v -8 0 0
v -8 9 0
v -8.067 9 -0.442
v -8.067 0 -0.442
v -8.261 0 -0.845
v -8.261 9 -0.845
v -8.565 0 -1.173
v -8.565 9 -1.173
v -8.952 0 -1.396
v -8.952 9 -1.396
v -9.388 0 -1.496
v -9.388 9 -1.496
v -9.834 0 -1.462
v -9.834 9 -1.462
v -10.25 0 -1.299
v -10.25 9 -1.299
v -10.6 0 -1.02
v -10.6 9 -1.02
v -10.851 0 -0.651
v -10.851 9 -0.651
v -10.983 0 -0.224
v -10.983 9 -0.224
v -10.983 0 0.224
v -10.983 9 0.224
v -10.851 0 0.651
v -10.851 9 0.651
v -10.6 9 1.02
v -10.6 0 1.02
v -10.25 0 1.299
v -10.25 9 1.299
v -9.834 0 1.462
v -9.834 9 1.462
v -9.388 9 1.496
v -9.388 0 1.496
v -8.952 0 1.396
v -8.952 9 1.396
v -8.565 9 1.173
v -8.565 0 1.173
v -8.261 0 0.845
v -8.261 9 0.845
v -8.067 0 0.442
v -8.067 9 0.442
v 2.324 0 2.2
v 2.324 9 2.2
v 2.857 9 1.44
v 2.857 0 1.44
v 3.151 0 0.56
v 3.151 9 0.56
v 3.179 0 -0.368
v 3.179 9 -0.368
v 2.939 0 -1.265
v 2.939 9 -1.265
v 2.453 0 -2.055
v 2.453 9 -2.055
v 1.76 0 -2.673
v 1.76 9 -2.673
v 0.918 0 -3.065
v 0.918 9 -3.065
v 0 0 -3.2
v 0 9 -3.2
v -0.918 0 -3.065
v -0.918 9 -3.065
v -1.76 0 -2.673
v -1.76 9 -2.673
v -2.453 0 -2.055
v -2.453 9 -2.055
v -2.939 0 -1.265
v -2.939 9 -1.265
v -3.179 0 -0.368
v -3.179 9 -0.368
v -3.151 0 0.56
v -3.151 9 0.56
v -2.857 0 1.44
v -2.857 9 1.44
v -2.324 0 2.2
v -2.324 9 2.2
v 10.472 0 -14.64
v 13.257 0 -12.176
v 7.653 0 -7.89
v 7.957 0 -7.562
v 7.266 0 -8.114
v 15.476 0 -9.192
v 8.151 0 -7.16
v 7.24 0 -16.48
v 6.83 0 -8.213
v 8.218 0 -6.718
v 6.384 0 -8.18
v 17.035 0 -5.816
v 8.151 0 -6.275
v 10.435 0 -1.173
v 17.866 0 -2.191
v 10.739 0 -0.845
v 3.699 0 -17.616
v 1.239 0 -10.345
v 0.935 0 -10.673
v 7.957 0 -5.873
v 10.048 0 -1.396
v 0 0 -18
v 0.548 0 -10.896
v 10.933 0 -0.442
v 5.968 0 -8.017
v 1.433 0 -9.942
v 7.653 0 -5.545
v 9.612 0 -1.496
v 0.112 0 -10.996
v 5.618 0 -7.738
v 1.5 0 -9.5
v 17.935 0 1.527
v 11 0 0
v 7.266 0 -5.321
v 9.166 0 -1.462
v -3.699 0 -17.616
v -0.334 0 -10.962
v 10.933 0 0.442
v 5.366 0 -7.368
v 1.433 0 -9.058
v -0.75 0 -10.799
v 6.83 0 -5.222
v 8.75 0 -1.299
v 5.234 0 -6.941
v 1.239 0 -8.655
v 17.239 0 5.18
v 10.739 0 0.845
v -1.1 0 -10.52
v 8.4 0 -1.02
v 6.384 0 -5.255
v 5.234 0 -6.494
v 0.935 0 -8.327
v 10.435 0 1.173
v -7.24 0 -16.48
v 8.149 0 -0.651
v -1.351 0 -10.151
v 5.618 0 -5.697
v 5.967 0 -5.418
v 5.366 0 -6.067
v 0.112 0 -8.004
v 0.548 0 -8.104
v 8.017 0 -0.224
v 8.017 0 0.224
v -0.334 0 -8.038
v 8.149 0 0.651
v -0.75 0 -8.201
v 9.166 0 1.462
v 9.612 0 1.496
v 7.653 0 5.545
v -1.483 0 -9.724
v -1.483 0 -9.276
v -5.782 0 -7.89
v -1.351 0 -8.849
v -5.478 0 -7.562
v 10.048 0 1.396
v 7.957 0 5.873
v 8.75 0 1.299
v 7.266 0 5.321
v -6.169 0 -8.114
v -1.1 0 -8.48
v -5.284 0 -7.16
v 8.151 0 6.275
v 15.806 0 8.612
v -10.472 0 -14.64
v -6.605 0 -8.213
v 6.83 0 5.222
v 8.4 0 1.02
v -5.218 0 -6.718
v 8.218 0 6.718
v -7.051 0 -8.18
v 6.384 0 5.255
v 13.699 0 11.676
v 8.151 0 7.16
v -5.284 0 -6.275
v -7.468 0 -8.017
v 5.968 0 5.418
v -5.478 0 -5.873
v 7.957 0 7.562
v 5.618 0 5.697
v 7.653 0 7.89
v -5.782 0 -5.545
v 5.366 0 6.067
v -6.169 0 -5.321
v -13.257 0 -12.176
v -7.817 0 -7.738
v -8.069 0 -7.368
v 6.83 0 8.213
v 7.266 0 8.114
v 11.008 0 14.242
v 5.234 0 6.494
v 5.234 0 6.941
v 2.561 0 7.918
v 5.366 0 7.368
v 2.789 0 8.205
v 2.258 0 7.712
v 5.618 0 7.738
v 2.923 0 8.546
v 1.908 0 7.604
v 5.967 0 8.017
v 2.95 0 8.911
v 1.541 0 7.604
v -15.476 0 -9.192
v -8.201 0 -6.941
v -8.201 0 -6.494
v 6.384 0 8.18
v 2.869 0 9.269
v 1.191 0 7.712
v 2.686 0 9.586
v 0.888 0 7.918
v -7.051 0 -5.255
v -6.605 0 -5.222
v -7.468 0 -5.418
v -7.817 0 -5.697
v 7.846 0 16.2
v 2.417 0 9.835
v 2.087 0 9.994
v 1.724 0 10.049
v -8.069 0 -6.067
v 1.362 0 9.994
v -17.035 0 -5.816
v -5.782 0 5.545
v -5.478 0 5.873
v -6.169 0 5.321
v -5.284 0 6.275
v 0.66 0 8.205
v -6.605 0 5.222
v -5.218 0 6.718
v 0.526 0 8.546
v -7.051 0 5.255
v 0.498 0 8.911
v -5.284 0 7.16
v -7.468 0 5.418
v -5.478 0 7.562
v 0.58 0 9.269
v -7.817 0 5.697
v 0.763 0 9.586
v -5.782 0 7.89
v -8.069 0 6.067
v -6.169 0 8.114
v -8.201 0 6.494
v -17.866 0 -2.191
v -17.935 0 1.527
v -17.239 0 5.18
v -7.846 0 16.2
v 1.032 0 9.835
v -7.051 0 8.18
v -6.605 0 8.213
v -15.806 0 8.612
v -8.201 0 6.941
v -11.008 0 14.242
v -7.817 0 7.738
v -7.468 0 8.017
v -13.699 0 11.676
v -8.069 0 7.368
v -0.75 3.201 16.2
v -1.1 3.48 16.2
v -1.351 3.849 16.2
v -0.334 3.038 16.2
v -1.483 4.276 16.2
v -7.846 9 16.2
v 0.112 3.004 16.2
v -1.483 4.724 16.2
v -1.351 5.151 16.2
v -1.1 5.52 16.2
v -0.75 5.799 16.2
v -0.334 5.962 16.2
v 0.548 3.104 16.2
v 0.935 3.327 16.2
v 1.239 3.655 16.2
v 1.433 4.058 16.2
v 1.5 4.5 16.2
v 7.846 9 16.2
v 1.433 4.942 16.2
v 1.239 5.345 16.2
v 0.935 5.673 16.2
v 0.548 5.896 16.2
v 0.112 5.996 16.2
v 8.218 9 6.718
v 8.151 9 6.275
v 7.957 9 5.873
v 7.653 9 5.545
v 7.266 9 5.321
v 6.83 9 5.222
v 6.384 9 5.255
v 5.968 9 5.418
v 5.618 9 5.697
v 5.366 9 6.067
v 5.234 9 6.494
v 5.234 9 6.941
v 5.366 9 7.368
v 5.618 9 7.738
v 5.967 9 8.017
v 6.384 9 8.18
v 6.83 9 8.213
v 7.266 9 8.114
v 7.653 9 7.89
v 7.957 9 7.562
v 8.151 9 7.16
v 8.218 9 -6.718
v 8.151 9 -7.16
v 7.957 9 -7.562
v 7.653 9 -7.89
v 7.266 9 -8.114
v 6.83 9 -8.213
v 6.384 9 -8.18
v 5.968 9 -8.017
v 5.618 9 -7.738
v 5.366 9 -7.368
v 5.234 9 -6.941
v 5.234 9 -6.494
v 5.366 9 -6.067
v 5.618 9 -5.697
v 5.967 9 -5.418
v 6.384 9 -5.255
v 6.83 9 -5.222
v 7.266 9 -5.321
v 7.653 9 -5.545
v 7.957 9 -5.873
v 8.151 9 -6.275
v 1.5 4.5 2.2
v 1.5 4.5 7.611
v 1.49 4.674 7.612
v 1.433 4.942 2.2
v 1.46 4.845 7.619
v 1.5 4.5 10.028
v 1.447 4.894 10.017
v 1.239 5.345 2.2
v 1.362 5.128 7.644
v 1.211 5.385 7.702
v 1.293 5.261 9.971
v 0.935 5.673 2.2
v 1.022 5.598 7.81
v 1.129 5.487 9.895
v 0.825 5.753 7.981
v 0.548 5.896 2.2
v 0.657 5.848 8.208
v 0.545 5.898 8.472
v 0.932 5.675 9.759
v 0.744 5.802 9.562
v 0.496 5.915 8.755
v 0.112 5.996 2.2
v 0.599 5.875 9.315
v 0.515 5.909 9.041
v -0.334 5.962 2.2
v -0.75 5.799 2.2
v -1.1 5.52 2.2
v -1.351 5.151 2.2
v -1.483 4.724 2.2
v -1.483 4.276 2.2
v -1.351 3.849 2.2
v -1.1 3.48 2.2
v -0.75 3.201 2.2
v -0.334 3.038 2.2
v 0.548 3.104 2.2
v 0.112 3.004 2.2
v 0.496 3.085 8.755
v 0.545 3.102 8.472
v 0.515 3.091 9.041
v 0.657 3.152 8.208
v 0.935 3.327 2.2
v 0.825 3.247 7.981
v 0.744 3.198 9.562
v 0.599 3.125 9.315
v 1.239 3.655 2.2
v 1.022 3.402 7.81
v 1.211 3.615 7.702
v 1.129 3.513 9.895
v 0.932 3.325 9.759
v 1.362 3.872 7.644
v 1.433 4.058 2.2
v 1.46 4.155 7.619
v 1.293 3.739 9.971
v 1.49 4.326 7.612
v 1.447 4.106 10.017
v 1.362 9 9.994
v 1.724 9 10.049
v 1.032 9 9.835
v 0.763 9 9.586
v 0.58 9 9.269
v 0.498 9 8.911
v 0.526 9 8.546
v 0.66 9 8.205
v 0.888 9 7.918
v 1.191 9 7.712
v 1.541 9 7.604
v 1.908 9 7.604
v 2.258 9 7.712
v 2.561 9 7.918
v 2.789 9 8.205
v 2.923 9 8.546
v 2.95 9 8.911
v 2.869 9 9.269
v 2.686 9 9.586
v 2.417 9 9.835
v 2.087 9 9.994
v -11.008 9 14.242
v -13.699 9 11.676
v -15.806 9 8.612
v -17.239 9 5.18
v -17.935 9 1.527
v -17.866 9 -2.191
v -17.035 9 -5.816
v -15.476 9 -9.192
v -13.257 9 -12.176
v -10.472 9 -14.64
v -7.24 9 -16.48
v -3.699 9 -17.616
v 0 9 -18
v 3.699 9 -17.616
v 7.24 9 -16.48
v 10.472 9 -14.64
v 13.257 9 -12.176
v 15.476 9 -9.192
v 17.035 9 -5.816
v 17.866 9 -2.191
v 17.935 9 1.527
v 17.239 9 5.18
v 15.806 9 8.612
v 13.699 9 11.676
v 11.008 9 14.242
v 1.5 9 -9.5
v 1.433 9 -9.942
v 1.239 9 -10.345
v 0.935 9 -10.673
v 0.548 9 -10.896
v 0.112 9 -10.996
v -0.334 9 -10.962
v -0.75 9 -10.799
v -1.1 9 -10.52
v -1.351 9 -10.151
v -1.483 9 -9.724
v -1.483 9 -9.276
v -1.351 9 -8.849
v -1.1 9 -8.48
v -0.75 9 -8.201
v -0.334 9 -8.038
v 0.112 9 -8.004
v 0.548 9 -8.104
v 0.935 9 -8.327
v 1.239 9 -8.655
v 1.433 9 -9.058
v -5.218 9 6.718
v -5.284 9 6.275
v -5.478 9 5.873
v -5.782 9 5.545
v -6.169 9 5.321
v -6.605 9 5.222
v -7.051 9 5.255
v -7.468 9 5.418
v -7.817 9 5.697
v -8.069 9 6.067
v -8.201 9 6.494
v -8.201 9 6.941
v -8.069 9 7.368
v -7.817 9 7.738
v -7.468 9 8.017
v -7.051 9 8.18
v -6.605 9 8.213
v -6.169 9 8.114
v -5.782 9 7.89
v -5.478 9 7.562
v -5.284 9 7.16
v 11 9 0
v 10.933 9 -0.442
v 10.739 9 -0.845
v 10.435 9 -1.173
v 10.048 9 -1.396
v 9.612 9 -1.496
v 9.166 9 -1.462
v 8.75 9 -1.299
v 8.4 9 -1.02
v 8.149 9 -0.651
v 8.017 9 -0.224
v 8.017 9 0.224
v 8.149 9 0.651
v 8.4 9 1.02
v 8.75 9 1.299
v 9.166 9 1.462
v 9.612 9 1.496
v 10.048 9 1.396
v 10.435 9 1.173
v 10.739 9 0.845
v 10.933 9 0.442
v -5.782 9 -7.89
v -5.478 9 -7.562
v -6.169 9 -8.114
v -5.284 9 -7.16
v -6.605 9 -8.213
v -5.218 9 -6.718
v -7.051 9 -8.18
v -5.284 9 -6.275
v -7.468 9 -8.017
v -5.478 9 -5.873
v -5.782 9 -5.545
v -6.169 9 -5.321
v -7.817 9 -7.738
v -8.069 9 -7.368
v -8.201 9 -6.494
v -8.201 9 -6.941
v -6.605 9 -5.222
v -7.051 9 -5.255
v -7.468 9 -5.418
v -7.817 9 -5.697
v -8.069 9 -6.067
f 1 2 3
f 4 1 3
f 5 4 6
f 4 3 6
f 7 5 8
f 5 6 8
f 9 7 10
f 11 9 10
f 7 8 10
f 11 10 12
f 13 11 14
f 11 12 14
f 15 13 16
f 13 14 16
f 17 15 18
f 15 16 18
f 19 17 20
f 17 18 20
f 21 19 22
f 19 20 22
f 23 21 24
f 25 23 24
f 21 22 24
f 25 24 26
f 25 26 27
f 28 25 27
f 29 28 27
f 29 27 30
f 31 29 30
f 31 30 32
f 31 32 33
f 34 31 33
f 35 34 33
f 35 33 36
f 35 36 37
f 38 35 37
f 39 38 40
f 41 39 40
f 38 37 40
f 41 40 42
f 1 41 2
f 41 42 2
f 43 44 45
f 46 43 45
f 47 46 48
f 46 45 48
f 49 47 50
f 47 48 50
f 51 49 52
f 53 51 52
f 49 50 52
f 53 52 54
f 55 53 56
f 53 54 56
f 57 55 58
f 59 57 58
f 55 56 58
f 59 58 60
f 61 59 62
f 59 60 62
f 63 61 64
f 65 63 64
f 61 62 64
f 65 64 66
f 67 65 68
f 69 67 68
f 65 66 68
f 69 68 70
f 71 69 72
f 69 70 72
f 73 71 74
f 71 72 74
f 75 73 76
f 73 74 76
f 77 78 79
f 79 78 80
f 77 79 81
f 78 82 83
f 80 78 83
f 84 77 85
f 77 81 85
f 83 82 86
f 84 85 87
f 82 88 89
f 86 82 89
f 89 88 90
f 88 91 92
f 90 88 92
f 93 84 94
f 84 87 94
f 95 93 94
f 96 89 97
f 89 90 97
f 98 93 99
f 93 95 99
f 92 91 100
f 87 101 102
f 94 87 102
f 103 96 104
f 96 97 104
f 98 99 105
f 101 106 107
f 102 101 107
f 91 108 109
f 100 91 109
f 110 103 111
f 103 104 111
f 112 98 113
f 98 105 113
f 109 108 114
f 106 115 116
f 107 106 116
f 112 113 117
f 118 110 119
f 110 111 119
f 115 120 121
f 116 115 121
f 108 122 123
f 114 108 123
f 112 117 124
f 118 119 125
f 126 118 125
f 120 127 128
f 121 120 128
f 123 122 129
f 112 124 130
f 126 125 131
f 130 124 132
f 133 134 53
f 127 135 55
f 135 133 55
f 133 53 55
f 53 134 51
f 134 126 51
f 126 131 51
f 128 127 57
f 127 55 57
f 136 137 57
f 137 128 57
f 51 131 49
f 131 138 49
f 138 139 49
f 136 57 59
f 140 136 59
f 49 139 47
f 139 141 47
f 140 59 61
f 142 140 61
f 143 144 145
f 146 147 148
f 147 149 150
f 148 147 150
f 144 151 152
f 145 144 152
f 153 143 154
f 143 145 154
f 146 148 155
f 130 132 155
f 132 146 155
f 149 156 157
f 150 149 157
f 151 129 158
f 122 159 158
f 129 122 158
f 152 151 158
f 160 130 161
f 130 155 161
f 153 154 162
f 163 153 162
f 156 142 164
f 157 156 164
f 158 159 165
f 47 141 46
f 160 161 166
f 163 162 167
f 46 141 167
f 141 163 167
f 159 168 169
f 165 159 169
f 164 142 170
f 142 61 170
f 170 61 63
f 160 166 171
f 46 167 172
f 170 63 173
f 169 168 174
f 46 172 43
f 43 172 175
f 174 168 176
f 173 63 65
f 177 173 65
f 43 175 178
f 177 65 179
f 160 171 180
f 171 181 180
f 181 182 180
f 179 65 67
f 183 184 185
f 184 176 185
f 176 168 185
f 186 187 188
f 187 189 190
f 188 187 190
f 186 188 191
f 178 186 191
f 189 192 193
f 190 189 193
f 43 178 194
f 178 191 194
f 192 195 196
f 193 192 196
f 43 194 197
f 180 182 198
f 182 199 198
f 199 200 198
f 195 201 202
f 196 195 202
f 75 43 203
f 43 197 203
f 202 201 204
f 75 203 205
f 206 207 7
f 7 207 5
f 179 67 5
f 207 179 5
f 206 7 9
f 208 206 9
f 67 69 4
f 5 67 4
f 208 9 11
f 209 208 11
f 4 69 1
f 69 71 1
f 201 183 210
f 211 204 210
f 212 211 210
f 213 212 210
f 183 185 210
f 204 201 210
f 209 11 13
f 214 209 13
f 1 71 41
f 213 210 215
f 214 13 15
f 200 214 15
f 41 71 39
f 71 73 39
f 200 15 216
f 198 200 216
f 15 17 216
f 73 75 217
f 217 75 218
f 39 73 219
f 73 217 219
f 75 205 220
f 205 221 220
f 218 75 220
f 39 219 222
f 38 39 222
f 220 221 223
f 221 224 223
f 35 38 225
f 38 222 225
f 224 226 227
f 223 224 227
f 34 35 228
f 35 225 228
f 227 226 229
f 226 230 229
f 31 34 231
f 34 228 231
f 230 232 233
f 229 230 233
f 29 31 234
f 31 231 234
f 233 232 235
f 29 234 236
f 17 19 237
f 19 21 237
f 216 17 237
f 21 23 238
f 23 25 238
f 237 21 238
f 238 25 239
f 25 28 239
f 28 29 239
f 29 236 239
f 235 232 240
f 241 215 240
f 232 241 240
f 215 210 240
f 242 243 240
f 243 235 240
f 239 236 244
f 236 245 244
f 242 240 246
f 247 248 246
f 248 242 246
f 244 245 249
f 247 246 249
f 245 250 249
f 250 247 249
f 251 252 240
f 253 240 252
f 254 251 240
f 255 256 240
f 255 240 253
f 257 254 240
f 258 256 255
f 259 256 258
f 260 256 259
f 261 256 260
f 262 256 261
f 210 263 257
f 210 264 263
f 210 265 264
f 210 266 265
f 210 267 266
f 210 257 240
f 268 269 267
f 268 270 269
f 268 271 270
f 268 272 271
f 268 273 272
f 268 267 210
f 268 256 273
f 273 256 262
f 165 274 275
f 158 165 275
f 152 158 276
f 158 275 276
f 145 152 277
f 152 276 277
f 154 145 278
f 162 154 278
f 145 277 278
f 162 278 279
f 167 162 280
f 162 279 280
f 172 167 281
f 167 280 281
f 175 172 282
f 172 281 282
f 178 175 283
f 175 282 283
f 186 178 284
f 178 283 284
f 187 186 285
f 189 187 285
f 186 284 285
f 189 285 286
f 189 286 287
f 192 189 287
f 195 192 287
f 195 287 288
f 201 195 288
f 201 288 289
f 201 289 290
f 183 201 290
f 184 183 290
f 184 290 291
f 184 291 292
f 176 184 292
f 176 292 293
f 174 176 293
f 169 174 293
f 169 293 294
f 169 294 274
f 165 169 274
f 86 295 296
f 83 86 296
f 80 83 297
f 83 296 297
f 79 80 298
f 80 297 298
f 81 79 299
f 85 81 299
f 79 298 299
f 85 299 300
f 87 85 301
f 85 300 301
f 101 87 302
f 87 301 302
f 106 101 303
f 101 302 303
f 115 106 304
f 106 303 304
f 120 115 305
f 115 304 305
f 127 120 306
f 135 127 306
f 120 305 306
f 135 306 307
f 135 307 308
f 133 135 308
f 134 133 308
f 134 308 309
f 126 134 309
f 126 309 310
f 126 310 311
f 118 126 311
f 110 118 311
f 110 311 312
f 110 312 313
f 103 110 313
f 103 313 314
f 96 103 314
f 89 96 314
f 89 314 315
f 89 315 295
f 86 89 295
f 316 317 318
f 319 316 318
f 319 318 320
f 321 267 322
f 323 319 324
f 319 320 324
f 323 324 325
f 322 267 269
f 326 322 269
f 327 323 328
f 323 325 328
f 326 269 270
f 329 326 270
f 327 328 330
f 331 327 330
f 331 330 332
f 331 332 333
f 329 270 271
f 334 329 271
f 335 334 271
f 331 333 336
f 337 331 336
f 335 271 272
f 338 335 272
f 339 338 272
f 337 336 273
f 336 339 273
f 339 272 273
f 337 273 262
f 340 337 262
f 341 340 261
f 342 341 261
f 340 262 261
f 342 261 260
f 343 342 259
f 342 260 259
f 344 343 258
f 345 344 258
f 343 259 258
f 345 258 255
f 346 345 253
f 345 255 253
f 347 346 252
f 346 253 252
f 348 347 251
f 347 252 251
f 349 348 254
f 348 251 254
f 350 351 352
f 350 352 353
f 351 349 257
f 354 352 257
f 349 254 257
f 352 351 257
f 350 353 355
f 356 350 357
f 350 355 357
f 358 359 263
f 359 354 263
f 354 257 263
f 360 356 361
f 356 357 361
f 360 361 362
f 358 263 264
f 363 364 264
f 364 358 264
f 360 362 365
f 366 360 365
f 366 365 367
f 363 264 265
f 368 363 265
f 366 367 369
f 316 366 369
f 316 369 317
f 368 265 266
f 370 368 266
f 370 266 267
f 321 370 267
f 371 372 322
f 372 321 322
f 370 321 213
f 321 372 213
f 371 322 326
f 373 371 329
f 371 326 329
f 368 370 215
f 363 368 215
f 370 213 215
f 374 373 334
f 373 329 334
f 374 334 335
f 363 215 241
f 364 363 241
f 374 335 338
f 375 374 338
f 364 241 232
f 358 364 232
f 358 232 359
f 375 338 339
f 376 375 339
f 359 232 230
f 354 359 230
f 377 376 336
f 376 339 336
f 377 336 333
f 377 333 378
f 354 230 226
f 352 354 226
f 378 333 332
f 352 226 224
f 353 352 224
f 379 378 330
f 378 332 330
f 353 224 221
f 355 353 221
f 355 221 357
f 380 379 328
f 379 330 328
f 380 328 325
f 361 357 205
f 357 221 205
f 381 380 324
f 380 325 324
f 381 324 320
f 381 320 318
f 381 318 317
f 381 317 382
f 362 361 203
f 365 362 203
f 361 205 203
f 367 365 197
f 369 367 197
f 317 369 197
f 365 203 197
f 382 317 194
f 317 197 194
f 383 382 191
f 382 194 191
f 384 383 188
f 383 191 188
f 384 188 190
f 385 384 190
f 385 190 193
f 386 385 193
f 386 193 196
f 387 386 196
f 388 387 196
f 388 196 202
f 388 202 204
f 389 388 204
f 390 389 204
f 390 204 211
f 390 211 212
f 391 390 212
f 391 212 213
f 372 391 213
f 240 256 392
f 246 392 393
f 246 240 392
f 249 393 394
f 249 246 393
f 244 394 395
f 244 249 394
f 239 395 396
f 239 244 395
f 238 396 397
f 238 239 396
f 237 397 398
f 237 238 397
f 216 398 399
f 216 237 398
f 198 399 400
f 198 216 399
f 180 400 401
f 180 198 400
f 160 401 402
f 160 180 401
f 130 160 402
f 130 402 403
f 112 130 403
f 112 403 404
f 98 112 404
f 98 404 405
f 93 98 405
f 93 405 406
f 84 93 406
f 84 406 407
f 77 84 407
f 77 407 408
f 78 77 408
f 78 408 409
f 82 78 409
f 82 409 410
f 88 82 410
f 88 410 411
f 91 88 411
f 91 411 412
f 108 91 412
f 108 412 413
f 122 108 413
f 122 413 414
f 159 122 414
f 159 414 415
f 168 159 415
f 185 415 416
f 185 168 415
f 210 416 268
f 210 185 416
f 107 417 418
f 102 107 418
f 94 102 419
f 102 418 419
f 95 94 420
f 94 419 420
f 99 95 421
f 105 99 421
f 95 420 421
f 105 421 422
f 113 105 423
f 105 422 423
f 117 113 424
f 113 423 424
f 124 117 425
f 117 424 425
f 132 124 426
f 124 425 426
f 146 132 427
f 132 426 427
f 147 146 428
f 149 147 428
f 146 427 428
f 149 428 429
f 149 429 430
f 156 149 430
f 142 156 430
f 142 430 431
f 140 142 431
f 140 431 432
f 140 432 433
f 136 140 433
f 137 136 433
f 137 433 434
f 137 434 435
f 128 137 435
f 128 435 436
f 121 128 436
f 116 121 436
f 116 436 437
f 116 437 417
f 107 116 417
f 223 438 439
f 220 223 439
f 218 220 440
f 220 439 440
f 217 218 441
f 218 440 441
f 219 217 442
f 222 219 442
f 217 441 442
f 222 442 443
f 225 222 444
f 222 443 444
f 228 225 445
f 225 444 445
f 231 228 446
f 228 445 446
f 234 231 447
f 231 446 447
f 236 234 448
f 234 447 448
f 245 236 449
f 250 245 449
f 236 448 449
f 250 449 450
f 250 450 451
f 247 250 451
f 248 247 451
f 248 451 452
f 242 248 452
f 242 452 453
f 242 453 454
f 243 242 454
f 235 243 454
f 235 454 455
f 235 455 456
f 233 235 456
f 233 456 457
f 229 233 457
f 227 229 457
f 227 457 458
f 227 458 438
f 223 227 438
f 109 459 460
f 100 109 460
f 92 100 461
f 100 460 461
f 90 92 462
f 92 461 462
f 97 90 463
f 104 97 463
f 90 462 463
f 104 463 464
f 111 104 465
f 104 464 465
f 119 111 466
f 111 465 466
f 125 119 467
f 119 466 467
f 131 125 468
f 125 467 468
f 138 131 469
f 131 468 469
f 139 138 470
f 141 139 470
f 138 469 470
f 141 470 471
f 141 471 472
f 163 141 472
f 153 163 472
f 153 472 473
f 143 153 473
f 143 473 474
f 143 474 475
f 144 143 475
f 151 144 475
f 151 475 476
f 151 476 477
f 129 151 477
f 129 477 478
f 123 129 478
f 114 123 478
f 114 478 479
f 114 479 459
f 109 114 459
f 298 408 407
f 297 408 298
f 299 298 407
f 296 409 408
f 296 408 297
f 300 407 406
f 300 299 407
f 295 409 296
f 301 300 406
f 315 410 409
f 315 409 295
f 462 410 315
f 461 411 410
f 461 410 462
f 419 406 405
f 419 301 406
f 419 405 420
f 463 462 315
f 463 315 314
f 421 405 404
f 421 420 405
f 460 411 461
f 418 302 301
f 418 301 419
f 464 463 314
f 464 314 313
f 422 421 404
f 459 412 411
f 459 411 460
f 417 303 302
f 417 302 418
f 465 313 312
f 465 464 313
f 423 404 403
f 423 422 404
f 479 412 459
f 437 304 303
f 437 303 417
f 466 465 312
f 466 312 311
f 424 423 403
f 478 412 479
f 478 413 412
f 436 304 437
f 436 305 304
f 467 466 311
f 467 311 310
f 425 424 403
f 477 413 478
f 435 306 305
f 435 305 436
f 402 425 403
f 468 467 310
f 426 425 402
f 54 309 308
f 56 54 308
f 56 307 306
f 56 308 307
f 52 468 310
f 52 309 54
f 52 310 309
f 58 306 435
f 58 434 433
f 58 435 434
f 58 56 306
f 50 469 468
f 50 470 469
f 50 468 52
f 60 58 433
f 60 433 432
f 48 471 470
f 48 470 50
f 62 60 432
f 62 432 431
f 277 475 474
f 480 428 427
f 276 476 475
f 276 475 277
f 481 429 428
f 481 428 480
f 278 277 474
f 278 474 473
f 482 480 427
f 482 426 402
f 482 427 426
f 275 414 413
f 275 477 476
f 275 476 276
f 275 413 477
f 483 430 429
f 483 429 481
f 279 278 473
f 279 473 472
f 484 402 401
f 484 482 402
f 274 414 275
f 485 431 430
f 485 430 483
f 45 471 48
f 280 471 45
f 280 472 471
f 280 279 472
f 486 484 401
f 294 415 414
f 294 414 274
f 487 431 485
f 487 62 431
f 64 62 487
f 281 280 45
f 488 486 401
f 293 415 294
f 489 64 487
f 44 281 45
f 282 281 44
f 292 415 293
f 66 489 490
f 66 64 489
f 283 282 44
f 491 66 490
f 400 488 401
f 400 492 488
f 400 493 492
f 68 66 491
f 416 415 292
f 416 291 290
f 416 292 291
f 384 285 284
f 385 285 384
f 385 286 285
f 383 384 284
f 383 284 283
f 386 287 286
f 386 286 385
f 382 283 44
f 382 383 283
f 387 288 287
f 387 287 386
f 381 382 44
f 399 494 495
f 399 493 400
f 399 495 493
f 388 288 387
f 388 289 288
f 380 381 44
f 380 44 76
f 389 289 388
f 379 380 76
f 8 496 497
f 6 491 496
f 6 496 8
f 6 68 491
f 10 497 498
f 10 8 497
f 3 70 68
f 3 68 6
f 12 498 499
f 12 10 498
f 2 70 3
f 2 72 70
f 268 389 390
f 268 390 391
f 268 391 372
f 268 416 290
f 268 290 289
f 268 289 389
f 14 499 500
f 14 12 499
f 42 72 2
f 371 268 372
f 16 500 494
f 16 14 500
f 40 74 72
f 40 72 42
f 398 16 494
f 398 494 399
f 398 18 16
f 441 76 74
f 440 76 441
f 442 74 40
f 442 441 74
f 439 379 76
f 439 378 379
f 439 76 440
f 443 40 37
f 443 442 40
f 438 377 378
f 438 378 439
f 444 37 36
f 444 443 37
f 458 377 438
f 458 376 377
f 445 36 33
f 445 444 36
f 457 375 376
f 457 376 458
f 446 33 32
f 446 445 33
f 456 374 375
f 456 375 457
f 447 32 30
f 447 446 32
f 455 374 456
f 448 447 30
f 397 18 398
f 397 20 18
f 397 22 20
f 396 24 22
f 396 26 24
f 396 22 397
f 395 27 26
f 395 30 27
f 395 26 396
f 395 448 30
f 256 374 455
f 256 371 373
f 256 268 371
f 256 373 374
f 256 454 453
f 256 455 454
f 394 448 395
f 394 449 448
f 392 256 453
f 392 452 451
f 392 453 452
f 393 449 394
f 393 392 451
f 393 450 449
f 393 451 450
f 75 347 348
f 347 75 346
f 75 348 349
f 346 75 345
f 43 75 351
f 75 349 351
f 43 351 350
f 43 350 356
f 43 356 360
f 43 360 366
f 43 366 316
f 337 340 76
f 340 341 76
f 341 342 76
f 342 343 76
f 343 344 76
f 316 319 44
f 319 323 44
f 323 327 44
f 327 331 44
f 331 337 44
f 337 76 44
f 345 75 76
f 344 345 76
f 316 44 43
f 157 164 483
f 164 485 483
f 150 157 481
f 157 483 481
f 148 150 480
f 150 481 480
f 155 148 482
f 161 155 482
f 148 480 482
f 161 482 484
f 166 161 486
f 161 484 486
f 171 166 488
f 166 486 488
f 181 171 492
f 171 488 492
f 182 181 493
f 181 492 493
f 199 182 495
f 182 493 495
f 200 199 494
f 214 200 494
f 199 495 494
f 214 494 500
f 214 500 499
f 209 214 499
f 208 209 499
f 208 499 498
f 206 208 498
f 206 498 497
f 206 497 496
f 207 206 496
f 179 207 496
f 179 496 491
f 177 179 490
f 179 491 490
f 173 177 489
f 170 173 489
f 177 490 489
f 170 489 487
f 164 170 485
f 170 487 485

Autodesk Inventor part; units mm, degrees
ref_plane "YZ Plane" through (0, 0, 0) normal (1, 0, 0) x (0, 1, 0)
ref_plane "XZ Plane" through (0, 0, 0) normal (0, 1, 0) x (-1, 0, 0)
ref_plane "XY Plane" through (0, 0, 0) normal (0, 0, 1) x (1, 0, 0)
sketch "BodySketch" plane through (0, 0, 0) normal (0, 1, 0) x (-1, 0, 0)
  circle A0 centre (0, 0) radius 18
  dimension "EncoderWheelInterface_Diameter" = 36
extrude "Body" add sketch "BodySketch" along normal blind 9
sketch "FasteningHoleSketch" plane through (0, 9, 0) normal (0, 1, 0) x (1, 0, 0)
  circle A0 centre (0, 0) radius 18 projected
  circle A1 centre (0, 9.5) radius 1.5
  line L0 (0, 0) -> (0, 20.8166) construction
  circle A2 centre (-6.7175, 6.7175) radius 1.5
  circle A3 centre (-9.5, 0) radius 1.5
  circle A4 centre (-6.7175, -6.7175) radius 1.5
  circle A5 centre (0, -9.5) radius 1.5
  circle A6 centre (6.7175, -6.7175) radius 1.5
  circle A7 centre (9.5, 0) radius 1.5
  circle A8 centre (6.7175, 6.7175) radius 1.5
  dimension "d3" = 9.5
  dimension "EncoderWheelInterface_FasteningHole_Diameter" = 3
  dimension "d7" = 360
sketch "ShaftHoleSketch" plane through (0, 9, 0) normal (0, 1, 0) x (1, 0, 0)
  circle A0 centre (0, 0) radius 18 projected
  arc A1 (2.3238, -2.2) -> (-2.3238, -2.2) centre (0, 0) ccw
  line L0 (-2.3238, -2.2) -> (2.3238, -2.2)
  dimension "d11" = 6.4
  dimension "d12" = 1
extrude "ShaftHole" cut sketch "ShaftHoleSketch" against normal up to next contours L0 A1
extrude "FasteningHole" cut sketch "FasteningHoleSketch" against normal up to next contours A1 | A2 | A3 | A4 | A6 | A7 | A8
sketch "MeplatSketch" plane through (0, 9, 0) normal (0, 1, 0) x (1, 0, 0)
  line L0 (2.3238, -2.2) -> (-2.3238, -2.2) projected
  circle A0 centre (0, 0) radius 18 projected
  line L1 (-7.846, -16.2) -> (7.846, -16.2)
  dimension "d19" = 14
extrude "Metplat" cut sketch "MeplatSketch" against normal up to next contours L1 A0 picked at (-1.3416, -16.6481)
sketch "MeplatHoleSketch" plane through (-7.846, 9, 16.2) normal (0, 0, 1) x (1, 0, 0)
  line L0 (0, -9) -> (15.692, 0) construction
  line L1 (0, 0) -> (15.692, -9) construction
  circle A0 centre (7.846, -4.5) radius 1.5
  point P0 (7.846, -9)
  dimension "EncoderWheelInterface_MeplatHole_Diameter" = 3
extrude "MeplatHole" cut sketch "MeplatHoleSketch" against normal up to surface (14 mm away)
thread "Thread1" size "M3x0.5" class "6H" standard "ANSI Metric M Profile" full length
hole "Hole1" at (1.7243, 9, 8.8194) direction (0, -1, 0) diameter 2.459 end through all thread size "M3x0.5" class "6H" standard "ANSI Metric M Profile"
equation "\"d3\" = EncoderWheel_FasteningHole_DistanceToCenter"
equation "\"d11\" = Encoder_Shaft_Diameter + EncoderWheelInterface_Margin"
equation "\"d12\" = Encoder_Shaft_Meplat_Depth"
equation "\"EncoderWheelInterface_Margin\" = 0.4"
equation "\"EncoderWheel_FasteningHole_DistanceToCenter\" = 9.5"
equation "\"Encoder_Shaft_Diameter\" = 6"
equation "\"Encoder_Shaft_Meplat_Depth\" = 1"
properties part number "EncoderWheelInterface" material "Polyethylene, High Density"
